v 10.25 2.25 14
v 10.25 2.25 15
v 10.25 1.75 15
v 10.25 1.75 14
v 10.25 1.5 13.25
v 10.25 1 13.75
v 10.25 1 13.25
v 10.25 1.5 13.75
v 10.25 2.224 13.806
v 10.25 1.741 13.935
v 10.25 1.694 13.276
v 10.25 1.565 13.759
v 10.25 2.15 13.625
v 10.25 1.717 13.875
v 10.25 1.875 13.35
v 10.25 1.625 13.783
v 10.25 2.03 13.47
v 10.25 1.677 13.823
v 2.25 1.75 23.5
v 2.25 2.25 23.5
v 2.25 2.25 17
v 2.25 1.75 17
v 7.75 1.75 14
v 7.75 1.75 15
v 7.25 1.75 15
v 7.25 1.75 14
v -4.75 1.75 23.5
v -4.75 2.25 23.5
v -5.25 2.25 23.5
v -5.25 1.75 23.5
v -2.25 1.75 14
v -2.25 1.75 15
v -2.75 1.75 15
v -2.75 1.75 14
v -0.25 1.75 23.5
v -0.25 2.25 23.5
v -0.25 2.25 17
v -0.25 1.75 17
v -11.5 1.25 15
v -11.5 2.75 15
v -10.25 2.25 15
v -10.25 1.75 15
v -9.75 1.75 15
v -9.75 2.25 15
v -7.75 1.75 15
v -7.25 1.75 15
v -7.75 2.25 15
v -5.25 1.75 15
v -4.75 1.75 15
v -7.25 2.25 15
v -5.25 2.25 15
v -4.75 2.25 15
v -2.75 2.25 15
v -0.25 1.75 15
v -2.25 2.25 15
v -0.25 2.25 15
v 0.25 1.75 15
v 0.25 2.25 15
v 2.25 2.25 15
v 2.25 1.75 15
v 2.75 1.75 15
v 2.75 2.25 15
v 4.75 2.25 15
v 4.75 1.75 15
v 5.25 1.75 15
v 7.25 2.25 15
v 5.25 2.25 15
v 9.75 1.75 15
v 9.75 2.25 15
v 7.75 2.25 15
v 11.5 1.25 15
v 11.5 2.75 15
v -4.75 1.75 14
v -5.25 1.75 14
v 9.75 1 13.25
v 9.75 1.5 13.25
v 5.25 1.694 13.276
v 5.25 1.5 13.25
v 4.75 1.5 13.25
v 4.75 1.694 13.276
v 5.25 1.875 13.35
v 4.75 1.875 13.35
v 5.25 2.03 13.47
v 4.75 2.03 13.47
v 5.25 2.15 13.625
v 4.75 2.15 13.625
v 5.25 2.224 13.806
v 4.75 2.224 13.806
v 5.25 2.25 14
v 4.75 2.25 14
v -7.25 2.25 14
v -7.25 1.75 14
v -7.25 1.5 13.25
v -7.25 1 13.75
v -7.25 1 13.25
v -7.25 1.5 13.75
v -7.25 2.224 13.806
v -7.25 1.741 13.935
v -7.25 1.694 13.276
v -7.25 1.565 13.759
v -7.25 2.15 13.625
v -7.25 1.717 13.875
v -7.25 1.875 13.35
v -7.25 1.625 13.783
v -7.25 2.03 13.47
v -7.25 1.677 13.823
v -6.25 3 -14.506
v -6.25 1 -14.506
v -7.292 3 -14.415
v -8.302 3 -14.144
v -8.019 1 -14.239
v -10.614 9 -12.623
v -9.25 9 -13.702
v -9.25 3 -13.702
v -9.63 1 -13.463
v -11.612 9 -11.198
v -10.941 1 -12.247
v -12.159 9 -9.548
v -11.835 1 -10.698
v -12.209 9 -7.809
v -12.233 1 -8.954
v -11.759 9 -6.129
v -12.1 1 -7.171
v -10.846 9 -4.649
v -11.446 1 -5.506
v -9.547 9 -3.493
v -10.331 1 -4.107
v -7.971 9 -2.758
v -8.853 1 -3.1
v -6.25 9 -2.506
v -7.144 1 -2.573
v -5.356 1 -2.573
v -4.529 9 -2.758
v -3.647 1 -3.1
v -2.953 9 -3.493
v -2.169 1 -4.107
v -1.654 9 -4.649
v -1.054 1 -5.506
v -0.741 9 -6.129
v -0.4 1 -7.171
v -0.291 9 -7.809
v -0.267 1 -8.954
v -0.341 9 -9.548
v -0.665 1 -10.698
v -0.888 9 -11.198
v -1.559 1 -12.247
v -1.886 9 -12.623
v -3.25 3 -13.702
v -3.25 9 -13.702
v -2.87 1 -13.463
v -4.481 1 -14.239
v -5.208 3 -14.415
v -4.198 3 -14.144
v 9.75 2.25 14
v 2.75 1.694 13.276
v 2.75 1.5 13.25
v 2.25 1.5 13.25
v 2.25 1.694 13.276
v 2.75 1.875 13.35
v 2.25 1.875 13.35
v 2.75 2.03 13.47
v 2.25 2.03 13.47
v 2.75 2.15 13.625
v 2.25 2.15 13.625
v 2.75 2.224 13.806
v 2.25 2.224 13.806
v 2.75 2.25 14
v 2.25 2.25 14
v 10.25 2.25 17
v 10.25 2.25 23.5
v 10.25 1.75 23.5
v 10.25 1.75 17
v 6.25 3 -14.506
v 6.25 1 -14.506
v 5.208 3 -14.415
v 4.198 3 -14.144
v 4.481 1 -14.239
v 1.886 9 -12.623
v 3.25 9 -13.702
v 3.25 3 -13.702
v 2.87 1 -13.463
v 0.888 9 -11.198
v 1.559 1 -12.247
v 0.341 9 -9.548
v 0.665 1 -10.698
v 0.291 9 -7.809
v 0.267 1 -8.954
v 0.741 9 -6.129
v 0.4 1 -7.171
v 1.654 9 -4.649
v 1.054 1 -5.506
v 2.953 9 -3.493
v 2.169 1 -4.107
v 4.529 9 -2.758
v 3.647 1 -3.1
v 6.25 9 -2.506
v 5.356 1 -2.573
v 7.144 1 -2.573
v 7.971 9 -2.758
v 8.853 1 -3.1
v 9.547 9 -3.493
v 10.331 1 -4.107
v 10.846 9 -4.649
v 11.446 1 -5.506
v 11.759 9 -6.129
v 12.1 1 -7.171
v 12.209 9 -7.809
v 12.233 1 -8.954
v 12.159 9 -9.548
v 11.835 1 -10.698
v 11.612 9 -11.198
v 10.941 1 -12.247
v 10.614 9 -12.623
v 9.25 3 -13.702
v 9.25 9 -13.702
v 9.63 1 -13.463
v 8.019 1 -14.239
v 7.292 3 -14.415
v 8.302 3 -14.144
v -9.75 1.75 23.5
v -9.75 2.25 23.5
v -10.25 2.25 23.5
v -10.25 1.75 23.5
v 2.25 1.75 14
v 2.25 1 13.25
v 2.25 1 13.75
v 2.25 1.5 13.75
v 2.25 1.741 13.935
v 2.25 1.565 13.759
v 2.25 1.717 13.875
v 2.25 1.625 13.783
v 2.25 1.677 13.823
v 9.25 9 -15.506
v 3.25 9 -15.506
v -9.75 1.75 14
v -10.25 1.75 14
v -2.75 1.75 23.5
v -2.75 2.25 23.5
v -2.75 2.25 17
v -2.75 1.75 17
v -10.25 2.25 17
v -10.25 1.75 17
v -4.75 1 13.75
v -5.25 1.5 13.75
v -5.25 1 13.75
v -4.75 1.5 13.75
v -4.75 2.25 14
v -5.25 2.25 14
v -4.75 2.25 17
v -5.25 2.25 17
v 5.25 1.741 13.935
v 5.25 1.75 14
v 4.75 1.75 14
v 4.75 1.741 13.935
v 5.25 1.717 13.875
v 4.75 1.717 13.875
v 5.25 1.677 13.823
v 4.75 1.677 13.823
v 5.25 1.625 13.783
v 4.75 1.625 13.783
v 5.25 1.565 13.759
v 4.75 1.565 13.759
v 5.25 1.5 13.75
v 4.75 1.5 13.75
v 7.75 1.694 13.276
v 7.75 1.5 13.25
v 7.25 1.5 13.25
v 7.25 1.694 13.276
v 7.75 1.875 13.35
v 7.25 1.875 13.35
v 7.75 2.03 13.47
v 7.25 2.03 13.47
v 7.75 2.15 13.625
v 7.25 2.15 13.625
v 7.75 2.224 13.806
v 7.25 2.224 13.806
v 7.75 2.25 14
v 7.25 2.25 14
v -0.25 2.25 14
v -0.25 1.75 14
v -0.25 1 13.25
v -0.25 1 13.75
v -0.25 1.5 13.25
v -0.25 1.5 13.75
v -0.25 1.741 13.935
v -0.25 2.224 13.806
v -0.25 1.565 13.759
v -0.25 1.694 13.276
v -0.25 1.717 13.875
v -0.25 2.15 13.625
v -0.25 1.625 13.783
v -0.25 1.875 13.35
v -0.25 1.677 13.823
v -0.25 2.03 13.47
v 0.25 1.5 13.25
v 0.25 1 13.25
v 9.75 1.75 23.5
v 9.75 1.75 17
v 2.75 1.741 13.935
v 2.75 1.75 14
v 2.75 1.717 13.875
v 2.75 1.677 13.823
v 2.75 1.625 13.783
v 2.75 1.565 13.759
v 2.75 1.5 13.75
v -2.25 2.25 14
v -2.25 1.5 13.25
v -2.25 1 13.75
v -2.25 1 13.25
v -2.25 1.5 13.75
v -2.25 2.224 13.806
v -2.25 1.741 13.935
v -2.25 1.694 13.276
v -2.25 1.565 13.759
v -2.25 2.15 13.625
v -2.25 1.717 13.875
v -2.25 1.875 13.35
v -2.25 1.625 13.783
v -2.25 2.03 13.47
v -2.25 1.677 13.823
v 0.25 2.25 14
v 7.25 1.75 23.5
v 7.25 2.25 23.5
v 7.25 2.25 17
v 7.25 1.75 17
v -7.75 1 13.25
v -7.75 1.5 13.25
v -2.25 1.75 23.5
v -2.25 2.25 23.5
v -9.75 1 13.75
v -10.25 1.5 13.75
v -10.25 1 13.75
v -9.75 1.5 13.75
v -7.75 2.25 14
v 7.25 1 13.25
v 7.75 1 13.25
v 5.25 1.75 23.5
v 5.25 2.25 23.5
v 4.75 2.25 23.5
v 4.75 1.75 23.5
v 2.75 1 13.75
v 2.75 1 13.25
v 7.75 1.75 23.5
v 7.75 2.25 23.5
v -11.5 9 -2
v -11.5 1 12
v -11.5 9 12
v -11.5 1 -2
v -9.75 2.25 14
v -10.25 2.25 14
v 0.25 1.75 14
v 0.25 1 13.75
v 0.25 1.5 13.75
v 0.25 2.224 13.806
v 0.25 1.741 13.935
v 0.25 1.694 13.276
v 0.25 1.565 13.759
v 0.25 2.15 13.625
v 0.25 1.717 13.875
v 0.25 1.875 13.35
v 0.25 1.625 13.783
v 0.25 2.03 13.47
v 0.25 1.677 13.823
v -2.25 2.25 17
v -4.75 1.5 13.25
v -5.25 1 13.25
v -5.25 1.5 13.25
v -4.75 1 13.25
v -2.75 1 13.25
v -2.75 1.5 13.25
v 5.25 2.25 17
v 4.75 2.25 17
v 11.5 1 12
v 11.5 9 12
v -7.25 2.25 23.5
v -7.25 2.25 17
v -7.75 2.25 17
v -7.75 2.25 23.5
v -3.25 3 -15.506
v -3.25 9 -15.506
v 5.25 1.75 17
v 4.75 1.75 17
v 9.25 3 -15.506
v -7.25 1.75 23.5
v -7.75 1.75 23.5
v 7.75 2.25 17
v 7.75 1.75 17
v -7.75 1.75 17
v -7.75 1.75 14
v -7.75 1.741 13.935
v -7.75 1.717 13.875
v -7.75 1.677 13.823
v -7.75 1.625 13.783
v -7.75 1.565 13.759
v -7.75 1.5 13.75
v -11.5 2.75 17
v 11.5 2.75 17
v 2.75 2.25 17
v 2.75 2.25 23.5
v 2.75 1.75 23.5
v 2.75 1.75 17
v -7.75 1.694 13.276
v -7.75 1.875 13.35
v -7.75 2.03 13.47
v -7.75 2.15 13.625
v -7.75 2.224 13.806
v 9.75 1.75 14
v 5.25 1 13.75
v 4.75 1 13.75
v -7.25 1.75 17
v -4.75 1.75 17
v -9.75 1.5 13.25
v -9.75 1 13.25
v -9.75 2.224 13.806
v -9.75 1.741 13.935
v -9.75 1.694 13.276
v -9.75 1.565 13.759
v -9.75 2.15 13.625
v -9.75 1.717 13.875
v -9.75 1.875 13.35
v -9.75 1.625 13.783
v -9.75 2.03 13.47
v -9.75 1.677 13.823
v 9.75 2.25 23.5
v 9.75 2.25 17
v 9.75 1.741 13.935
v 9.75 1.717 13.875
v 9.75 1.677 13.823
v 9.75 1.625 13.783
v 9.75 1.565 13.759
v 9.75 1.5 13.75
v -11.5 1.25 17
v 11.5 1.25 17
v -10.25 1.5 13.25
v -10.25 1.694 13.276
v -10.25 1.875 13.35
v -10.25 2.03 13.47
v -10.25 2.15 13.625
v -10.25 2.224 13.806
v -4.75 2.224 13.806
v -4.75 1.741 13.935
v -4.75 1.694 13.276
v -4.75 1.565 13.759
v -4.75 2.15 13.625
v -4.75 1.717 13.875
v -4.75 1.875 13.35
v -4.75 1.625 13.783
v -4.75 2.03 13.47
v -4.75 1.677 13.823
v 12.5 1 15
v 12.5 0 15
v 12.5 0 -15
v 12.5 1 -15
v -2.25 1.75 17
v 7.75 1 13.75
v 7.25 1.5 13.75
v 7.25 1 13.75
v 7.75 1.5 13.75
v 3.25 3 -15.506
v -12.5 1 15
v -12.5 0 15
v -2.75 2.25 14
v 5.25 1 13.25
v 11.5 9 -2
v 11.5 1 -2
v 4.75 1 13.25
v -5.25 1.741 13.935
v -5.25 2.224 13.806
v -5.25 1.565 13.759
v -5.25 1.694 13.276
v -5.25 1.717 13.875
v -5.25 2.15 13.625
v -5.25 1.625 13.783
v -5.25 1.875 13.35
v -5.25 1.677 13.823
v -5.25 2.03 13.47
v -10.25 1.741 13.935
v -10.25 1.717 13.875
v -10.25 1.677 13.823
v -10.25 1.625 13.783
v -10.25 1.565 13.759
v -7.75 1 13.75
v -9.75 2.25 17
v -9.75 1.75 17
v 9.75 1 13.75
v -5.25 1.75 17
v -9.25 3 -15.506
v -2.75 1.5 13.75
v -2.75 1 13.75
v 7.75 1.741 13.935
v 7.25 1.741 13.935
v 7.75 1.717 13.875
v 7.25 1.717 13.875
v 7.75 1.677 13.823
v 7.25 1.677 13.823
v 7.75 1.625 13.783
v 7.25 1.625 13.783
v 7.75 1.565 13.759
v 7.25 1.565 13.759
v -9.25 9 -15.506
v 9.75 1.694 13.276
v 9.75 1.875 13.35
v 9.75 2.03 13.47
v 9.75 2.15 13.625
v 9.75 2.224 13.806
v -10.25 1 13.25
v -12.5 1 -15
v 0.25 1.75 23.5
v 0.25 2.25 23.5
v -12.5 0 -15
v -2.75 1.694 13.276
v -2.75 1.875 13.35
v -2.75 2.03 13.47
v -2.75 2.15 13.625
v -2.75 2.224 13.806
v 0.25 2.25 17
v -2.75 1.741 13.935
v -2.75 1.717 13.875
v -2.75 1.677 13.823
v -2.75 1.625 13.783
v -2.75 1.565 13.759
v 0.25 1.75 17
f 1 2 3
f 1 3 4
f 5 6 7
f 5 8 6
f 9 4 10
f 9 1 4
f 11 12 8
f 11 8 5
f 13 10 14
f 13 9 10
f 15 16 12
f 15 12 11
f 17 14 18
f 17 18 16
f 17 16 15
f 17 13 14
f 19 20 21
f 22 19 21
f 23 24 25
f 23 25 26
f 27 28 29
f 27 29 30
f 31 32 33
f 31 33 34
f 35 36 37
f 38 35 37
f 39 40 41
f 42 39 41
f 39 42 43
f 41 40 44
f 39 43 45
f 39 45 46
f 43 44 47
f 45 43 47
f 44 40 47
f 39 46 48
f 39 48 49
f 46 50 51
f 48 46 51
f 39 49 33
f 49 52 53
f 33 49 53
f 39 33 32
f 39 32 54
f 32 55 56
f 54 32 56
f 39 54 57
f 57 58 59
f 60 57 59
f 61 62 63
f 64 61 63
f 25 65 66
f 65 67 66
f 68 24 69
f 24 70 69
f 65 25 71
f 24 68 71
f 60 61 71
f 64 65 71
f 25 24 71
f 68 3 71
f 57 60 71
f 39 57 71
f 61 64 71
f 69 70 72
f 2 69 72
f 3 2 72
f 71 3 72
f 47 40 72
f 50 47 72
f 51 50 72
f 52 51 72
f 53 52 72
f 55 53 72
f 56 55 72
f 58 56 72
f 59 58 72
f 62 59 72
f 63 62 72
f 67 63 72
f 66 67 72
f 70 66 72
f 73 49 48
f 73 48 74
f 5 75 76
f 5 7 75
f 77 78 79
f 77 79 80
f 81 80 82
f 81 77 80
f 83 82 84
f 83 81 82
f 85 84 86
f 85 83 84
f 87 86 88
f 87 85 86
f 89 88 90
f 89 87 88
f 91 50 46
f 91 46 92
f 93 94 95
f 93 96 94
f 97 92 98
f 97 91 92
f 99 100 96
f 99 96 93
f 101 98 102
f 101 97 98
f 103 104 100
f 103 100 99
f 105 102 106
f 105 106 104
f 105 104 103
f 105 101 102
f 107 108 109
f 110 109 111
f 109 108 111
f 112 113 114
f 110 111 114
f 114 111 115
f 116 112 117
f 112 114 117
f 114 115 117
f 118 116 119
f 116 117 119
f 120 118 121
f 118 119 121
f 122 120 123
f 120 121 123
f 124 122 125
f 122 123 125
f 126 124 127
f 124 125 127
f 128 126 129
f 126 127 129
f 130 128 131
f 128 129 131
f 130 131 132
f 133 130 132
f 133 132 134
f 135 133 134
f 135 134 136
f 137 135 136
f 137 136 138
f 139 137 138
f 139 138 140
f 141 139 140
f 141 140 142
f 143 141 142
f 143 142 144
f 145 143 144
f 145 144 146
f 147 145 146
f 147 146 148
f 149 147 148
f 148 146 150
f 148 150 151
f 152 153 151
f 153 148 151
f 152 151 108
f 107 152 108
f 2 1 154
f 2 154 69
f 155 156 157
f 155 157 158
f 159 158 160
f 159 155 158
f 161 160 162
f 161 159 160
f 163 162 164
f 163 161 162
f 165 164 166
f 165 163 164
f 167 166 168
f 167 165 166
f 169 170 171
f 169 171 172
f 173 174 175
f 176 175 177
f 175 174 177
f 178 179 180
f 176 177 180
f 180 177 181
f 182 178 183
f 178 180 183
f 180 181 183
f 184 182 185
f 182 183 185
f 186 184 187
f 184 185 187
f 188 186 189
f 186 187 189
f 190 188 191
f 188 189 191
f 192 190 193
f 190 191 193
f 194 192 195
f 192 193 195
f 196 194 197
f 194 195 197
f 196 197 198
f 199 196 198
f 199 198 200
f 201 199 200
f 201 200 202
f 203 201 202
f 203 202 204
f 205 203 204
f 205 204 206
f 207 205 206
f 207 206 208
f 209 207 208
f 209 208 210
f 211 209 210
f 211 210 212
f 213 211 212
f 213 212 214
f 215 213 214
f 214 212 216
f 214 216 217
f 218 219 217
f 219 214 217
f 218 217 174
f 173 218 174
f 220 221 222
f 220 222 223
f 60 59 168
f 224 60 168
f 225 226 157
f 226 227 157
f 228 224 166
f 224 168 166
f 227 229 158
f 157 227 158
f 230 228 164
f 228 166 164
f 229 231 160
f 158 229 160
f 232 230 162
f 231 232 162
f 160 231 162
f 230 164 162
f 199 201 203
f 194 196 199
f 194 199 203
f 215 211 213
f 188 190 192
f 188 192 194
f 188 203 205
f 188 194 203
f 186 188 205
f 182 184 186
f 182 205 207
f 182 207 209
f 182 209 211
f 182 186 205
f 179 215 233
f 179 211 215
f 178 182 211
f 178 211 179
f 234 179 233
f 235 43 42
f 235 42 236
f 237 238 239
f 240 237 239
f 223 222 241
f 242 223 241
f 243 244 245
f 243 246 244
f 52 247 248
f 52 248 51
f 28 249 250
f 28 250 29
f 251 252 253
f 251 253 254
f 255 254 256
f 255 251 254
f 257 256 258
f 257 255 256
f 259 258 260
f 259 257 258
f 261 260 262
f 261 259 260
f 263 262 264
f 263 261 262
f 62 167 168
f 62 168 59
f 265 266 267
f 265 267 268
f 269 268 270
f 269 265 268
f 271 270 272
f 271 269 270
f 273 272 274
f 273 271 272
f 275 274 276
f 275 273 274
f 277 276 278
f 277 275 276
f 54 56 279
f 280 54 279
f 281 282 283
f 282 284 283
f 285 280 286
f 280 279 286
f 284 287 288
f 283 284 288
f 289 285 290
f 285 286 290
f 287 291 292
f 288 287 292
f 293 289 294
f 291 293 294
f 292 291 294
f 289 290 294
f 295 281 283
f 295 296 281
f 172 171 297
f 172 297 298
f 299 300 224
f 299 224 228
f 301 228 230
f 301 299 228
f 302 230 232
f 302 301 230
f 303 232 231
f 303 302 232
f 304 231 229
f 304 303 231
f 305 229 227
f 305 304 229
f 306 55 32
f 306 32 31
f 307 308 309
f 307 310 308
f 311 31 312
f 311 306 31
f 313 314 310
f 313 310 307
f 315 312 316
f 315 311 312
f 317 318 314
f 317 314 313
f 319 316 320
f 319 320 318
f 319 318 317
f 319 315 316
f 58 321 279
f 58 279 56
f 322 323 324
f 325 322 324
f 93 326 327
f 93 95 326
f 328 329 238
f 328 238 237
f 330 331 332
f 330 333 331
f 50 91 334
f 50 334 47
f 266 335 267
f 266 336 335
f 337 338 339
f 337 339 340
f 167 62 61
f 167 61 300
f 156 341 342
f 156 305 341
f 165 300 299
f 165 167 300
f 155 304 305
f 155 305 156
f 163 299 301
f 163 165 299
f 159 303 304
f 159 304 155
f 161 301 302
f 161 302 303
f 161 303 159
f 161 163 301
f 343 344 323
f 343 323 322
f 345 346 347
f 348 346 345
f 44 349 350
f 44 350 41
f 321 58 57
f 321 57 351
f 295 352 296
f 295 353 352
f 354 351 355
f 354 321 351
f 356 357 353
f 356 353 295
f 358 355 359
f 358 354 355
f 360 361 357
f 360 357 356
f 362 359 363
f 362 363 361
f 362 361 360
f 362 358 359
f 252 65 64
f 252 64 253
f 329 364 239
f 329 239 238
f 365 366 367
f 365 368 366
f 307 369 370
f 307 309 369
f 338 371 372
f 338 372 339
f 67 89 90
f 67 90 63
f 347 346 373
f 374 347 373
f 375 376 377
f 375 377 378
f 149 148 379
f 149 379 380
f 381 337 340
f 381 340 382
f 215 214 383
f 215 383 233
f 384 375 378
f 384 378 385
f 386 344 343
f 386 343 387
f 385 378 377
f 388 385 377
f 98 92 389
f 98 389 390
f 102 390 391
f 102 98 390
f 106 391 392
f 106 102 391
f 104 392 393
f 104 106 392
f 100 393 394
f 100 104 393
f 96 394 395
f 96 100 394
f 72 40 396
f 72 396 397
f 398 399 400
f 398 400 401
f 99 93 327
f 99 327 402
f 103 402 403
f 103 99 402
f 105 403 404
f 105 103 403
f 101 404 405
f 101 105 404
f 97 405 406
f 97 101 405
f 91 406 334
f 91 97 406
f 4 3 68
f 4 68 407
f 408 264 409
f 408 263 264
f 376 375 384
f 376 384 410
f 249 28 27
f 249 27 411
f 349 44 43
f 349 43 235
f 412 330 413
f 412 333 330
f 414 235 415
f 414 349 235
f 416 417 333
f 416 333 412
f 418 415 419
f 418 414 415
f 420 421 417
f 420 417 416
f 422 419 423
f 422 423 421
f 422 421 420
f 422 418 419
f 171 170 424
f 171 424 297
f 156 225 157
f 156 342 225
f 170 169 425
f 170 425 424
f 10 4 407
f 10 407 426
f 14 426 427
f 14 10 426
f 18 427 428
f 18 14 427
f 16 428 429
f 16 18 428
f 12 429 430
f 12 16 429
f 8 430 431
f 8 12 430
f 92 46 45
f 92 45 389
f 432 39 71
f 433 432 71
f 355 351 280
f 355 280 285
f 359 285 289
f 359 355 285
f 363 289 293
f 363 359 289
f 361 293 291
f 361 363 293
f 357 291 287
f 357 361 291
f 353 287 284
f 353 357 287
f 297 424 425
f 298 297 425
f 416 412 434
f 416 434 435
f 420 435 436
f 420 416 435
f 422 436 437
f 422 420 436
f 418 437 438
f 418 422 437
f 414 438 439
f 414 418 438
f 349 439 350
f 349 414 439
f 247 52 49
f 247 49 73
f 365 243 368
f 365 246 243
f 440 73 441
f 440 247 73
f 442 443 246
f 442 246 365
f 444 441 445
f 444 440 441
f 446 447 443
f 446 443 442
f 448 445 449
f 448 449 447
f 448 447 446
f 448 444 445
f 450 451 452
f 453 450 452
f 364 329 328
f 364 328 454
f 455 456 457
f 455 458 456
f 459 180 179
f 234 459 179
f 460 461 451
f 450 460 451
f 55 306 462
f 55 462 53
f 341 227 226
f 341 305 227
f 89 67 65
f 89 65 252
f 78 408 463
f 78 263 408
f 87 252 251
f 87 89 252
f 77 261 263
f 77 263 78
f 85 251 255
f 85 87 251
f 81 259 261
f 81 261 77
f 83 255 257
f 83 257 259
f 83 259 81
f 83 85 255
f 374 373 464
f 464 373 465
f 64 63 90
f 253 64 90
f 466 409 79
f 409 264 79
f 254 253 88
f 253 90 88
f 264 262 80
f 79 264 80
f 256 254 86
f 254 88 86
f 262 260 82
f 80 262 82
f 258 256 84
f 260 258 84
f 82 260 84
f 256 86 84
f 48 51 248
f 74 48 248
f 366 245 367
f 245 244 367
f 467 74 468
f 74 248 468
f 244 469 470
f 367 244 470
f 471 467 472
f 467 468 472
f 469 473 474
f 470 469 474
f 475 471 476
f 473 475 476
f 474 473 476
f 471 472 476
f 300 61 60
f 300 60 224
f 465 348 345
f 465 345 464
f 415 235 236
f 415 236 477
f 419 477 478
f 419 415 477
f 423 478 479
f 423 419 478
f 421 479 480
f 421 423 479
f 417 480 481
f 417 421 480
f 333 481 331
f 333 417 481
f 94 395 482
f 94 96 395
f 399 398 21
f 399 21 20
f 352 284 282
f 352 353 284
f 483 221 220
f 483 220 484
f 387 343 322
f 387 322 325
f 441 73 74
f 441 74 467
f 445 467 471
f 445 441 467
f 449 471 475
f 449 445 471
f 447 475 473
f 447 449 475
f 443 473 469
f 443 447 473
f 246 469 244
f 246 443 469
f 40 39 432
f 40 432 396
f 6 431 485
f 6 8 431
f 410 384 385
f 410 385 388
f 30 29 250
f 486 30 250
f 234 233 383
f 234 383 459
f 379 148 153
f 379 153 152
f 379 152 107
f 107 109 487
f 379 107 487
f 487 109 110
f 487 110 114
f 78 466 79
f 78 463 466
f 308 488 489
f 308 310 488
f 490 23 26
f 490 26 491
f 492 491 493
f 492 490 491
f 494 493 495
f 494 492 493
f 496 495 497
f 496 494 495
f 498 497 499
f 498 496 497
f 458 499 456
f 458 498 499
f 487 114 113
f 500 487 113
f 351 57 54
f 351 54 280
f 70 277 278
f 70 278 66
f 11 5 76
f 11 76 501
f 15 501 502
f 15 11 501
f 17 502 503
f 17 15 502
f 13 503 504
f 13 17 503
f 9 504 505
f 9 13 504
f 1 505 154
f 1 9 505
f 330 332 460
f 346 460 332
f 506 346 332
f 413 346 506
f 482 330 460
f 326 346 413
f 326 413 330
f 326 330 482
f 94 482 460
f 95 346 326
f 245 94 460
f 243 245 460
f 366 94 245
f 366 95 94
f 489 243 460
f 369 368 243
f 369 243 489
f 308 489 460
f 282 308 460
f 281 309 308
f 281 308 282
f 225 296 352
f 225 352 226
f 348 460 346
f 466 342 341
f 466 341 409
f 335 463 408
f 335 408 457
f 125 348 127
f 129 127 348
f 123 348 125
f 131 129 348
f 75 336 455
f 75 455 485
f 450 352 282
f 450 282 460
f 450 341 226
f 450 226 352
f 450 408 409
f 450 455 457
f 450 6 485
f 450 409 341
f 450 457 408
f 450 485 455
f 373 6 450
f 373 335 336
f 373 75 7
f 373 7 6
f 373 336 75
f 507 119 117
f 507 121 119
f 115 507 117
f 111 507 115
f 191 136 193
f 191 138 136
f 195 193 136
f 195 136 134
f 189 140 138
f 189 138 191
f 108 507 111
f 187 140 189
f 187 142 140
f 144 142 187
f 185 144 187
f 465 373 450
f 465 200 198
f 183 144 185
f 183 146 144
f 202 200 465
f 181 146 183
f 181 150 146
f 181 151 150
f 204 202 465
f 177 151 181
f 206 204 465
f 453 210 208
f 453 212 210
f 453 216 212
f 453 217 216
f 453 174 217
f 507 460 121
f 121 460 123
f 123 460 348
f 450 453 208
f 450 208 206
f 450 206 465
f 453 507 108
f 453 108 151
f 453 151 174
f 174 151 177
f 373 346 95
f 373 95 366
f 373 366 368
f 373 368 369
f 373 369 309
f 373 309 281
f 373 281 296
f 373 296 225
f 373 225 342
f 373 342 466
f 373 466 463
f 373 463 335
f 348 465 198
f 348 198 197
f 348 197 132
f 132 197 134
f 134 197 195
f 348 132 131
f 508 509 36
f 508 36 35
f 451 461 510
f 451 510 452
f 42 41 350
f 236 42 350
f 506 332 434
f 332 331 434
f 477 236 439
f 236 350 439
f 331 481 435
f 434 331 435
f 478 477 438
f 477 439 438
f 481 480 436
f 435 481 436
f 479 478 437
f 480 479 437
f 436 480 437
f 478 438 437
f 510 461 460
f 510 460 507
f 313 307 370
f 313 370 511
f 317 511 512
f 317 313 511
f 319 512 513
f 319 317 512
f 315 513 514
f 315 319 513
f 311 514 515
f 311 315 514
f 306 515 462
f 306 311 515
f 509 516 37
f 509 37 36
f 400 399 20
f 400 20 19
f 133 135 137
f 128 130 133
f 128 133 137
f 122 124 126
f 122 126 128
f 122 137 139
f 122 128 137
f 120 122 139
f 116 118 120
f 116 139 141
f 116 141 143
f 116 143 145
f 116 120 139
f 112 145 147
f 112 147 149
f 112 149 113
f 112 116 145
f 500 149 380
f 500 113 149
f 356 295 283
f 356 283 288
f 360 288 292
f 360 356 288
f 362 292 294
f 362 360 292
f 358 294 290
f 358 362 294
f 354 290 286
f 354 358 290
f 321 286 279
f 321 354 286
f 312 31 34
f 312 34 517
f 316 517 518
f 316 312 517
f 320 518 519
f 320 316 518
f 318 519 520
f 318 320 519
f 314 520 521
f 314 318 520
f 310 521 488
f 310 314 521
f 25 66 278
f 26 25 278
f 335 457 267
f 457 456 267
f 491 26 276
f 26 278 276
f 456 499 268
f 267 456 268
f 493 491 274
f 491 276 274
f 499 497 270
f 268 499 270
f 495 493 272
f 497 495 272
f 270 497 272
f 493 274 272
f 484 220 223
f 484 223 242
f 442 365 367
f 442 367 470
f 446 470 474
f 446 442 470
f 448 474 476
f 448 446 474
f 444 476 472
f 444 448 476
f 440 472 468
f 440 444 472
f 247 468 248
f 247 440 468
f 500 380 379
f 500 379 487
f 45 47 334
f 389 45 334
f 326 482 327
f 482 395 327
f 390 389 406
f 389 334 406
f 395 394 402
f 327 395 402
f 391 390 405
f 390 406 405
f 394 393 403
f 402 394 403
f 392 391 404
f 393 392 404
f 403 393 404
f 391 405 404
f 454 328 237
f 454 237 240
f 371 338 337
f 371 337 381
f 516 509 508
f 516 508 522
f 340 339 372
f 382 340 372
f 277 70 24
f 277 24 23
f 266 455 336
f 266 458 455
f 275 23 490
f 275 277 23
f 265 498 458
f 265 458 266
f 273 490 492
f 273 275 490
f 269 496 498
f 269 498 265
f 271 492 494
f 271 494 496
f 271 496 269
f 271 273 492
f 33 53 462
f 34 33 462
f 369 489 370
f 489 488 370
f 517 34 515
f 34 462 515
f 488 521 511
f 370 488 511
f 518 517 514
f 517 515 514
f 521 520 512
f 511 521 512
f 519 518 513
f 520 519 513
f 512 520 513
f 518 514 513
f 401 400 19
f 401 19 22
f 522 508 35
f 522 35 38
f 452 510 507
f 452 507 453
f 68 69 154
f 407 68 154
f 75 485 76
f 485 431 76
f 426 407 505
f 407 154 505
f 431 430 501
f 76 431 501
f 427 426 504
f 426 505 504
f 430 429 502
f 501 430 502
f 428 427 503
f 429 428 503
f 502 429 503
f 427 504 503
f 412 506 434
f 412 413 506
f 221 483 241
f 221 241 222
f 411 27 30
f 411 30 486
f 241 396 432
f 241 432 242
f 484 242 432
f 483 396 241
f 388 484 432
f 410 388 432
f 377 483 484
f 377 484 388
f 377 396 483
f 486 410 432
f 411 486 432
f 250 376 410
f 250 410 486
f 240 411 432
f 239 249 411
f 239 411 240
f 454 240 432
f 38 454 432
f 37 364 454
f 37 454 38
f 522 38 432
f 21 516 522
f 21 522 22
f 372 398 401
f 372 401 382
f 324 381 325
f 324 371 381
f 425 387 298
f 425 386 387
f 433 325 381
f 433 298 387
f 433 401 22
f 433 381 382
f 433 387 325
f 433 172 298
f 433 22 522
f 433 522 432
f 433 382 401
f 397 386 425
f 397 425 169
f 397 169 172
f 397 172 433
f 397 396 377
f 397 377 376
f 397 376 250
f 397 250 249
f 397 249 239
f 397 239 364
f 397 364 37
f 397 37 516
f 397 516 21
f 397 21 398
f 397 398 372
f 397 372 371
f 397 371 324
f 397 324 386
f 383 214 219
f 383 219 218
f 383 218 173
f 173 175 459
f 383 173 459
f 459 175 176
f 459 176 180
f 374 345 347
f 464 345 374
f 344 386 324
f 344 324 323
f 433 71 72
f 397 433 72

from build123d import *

# Parameters (mm, degrees)
SKIZZE1_W                 = 25
SKIZZE1_H                 = 30
GRUNDPLATTE_DEPTH         = 1
SKIZZE2_W                 = 23
SKIZZE2_H                 = 14
ZIFFERNBLATT_DEPTH        = 8
SKIZZE3_R                 = 6
BUZZER1_DEPTH             = 8
BUZZER2_DEPTH             = 1
BUZZER2_DEPTH_BACK        = 5
SKIZZE4_W                 = 6
SKIZZE4_H                 = 6
KONTAKTSTIFT_DEPTH        = 0.25
MUSTER_KONTAKTSTIFT_COUNT = 9
MUSTER_KONTAKTSTIFT_PITCH = 2.5
SKIZZE6_W                 = 23
SKIZZE6_H                 = 1.5
BUCHSENANSCHLAG_DEPTH     = 2


with BuildPart() as part:
    # Skizze1 → Grundplatte (new body)
    with BuildSketch(Plane(origin=(0, 0, 0), x_dir=(1, 0, 0), z_dir=(0, 1, 0))):
        Rectangle(SKIZZE1_W, SKIZZE1_H)
    extrude(amount=GRUNDPLATTE_DEPTH)

    # Skizze2 → Ziffernblatt (add)
    with BuildSketch(Plane(origin=(0, 1, 0), x_dir=(1, 0, 0), z_dir=(0, 1, 0))):
        with Locations((0, -5)):
            Rectangle(SKIZZE2_W, SKIZZE2_H)
    extrude(amount=ZIFFERNBLATT_DEPTH)

    # Skizze3 → Buzzer1 (add)
    with BuildSketch(Plane(origin=(0, 1, 0), x_dir=(1, 0, 0), z_dir=(0, 1, 0))):
        with Locations(Location((-6.25, 8.505687735, 0), (0, 0, 90))):
            Circle(SKIZZE3_R)
        with Locations(Location((6.25, 8.505687735, 0), (0, 0, 90))):
            Circle(SKIZZE3_R)
    extrude(amount=BUZZER1_DEPTH)

    # Skizze4 → Buzzer2 (add, two sides: drawn at the far end of the back side and taken through both)
    with BuildSketch(Plane(origin=(0, 0, -14.505687735), x_dir=(-1, 0, 0), z_dir=(0, 0, -1)).offset(-BUZZER2_DEPTH_BACK)):
        with Locations((-6.25, 6)):
            Rectangle(SKIZZE4_W, SKIZZE4_H)
        with Locations((6.25, 6)):
            Rectangle(SKIZZE4_W, SKIZZE4_H)
    extrude(amount=BUZZER2_DEPTH + BUZZER2_DEPTH_BACK)

    # Skizze5 → Kontaktstift (add, symmetric)
    with BuildSketch(Plane(origin=(10, 0, 0), x_dir=(0, 0, -1), z_dir=(1, 0, 0))):
        with BuildLine():
            Line((-13.25, 1), (-13.25, 1.5))
            ThreePointArc((-13.25, 1.5), (-13.469669914, 2.030330086), (-14, 2.25))
            Line((-14, 2.25), (-23.5, 2.25))
            Line((-23.5, 2.25), (-23.5, 1.75))
            Line((-23.5, 1.75), (-14, 1.75))
            ThreePointArc((-14, 1.75), (-13.823223305, 1.676776695), (-13.75, 1.5))
            Line((-13.75, 1.5), (-13.75, 1))
            Line((-13.75, 1), (-13.25, 1))
        make_face()
    kontaktstift = extrude(amount=KONTAKTSTIFT_DEPTH, both=True)

    # Muster_Kontaktstift: Kontaktstift ×9
    with Locations(*[(-i * MUSTER_KONTAKTSTIFT_PITCH, 0, 0) for i in range(1, MUSTER_KONTAKTSTIFT_COUNT)]):
        add(kontaktstift)

    # Skizze6 → Buchsenanschlag (add)
    with BuildSketch(Plane.XY.offset(15)):
        with Locations((0, 2)):
            Rectangle(SKIZZE6_W, SKIZZE6_H)
    extrude(amount=BUCHSENANSCHLAG_DEPTH)


solid = part.part
